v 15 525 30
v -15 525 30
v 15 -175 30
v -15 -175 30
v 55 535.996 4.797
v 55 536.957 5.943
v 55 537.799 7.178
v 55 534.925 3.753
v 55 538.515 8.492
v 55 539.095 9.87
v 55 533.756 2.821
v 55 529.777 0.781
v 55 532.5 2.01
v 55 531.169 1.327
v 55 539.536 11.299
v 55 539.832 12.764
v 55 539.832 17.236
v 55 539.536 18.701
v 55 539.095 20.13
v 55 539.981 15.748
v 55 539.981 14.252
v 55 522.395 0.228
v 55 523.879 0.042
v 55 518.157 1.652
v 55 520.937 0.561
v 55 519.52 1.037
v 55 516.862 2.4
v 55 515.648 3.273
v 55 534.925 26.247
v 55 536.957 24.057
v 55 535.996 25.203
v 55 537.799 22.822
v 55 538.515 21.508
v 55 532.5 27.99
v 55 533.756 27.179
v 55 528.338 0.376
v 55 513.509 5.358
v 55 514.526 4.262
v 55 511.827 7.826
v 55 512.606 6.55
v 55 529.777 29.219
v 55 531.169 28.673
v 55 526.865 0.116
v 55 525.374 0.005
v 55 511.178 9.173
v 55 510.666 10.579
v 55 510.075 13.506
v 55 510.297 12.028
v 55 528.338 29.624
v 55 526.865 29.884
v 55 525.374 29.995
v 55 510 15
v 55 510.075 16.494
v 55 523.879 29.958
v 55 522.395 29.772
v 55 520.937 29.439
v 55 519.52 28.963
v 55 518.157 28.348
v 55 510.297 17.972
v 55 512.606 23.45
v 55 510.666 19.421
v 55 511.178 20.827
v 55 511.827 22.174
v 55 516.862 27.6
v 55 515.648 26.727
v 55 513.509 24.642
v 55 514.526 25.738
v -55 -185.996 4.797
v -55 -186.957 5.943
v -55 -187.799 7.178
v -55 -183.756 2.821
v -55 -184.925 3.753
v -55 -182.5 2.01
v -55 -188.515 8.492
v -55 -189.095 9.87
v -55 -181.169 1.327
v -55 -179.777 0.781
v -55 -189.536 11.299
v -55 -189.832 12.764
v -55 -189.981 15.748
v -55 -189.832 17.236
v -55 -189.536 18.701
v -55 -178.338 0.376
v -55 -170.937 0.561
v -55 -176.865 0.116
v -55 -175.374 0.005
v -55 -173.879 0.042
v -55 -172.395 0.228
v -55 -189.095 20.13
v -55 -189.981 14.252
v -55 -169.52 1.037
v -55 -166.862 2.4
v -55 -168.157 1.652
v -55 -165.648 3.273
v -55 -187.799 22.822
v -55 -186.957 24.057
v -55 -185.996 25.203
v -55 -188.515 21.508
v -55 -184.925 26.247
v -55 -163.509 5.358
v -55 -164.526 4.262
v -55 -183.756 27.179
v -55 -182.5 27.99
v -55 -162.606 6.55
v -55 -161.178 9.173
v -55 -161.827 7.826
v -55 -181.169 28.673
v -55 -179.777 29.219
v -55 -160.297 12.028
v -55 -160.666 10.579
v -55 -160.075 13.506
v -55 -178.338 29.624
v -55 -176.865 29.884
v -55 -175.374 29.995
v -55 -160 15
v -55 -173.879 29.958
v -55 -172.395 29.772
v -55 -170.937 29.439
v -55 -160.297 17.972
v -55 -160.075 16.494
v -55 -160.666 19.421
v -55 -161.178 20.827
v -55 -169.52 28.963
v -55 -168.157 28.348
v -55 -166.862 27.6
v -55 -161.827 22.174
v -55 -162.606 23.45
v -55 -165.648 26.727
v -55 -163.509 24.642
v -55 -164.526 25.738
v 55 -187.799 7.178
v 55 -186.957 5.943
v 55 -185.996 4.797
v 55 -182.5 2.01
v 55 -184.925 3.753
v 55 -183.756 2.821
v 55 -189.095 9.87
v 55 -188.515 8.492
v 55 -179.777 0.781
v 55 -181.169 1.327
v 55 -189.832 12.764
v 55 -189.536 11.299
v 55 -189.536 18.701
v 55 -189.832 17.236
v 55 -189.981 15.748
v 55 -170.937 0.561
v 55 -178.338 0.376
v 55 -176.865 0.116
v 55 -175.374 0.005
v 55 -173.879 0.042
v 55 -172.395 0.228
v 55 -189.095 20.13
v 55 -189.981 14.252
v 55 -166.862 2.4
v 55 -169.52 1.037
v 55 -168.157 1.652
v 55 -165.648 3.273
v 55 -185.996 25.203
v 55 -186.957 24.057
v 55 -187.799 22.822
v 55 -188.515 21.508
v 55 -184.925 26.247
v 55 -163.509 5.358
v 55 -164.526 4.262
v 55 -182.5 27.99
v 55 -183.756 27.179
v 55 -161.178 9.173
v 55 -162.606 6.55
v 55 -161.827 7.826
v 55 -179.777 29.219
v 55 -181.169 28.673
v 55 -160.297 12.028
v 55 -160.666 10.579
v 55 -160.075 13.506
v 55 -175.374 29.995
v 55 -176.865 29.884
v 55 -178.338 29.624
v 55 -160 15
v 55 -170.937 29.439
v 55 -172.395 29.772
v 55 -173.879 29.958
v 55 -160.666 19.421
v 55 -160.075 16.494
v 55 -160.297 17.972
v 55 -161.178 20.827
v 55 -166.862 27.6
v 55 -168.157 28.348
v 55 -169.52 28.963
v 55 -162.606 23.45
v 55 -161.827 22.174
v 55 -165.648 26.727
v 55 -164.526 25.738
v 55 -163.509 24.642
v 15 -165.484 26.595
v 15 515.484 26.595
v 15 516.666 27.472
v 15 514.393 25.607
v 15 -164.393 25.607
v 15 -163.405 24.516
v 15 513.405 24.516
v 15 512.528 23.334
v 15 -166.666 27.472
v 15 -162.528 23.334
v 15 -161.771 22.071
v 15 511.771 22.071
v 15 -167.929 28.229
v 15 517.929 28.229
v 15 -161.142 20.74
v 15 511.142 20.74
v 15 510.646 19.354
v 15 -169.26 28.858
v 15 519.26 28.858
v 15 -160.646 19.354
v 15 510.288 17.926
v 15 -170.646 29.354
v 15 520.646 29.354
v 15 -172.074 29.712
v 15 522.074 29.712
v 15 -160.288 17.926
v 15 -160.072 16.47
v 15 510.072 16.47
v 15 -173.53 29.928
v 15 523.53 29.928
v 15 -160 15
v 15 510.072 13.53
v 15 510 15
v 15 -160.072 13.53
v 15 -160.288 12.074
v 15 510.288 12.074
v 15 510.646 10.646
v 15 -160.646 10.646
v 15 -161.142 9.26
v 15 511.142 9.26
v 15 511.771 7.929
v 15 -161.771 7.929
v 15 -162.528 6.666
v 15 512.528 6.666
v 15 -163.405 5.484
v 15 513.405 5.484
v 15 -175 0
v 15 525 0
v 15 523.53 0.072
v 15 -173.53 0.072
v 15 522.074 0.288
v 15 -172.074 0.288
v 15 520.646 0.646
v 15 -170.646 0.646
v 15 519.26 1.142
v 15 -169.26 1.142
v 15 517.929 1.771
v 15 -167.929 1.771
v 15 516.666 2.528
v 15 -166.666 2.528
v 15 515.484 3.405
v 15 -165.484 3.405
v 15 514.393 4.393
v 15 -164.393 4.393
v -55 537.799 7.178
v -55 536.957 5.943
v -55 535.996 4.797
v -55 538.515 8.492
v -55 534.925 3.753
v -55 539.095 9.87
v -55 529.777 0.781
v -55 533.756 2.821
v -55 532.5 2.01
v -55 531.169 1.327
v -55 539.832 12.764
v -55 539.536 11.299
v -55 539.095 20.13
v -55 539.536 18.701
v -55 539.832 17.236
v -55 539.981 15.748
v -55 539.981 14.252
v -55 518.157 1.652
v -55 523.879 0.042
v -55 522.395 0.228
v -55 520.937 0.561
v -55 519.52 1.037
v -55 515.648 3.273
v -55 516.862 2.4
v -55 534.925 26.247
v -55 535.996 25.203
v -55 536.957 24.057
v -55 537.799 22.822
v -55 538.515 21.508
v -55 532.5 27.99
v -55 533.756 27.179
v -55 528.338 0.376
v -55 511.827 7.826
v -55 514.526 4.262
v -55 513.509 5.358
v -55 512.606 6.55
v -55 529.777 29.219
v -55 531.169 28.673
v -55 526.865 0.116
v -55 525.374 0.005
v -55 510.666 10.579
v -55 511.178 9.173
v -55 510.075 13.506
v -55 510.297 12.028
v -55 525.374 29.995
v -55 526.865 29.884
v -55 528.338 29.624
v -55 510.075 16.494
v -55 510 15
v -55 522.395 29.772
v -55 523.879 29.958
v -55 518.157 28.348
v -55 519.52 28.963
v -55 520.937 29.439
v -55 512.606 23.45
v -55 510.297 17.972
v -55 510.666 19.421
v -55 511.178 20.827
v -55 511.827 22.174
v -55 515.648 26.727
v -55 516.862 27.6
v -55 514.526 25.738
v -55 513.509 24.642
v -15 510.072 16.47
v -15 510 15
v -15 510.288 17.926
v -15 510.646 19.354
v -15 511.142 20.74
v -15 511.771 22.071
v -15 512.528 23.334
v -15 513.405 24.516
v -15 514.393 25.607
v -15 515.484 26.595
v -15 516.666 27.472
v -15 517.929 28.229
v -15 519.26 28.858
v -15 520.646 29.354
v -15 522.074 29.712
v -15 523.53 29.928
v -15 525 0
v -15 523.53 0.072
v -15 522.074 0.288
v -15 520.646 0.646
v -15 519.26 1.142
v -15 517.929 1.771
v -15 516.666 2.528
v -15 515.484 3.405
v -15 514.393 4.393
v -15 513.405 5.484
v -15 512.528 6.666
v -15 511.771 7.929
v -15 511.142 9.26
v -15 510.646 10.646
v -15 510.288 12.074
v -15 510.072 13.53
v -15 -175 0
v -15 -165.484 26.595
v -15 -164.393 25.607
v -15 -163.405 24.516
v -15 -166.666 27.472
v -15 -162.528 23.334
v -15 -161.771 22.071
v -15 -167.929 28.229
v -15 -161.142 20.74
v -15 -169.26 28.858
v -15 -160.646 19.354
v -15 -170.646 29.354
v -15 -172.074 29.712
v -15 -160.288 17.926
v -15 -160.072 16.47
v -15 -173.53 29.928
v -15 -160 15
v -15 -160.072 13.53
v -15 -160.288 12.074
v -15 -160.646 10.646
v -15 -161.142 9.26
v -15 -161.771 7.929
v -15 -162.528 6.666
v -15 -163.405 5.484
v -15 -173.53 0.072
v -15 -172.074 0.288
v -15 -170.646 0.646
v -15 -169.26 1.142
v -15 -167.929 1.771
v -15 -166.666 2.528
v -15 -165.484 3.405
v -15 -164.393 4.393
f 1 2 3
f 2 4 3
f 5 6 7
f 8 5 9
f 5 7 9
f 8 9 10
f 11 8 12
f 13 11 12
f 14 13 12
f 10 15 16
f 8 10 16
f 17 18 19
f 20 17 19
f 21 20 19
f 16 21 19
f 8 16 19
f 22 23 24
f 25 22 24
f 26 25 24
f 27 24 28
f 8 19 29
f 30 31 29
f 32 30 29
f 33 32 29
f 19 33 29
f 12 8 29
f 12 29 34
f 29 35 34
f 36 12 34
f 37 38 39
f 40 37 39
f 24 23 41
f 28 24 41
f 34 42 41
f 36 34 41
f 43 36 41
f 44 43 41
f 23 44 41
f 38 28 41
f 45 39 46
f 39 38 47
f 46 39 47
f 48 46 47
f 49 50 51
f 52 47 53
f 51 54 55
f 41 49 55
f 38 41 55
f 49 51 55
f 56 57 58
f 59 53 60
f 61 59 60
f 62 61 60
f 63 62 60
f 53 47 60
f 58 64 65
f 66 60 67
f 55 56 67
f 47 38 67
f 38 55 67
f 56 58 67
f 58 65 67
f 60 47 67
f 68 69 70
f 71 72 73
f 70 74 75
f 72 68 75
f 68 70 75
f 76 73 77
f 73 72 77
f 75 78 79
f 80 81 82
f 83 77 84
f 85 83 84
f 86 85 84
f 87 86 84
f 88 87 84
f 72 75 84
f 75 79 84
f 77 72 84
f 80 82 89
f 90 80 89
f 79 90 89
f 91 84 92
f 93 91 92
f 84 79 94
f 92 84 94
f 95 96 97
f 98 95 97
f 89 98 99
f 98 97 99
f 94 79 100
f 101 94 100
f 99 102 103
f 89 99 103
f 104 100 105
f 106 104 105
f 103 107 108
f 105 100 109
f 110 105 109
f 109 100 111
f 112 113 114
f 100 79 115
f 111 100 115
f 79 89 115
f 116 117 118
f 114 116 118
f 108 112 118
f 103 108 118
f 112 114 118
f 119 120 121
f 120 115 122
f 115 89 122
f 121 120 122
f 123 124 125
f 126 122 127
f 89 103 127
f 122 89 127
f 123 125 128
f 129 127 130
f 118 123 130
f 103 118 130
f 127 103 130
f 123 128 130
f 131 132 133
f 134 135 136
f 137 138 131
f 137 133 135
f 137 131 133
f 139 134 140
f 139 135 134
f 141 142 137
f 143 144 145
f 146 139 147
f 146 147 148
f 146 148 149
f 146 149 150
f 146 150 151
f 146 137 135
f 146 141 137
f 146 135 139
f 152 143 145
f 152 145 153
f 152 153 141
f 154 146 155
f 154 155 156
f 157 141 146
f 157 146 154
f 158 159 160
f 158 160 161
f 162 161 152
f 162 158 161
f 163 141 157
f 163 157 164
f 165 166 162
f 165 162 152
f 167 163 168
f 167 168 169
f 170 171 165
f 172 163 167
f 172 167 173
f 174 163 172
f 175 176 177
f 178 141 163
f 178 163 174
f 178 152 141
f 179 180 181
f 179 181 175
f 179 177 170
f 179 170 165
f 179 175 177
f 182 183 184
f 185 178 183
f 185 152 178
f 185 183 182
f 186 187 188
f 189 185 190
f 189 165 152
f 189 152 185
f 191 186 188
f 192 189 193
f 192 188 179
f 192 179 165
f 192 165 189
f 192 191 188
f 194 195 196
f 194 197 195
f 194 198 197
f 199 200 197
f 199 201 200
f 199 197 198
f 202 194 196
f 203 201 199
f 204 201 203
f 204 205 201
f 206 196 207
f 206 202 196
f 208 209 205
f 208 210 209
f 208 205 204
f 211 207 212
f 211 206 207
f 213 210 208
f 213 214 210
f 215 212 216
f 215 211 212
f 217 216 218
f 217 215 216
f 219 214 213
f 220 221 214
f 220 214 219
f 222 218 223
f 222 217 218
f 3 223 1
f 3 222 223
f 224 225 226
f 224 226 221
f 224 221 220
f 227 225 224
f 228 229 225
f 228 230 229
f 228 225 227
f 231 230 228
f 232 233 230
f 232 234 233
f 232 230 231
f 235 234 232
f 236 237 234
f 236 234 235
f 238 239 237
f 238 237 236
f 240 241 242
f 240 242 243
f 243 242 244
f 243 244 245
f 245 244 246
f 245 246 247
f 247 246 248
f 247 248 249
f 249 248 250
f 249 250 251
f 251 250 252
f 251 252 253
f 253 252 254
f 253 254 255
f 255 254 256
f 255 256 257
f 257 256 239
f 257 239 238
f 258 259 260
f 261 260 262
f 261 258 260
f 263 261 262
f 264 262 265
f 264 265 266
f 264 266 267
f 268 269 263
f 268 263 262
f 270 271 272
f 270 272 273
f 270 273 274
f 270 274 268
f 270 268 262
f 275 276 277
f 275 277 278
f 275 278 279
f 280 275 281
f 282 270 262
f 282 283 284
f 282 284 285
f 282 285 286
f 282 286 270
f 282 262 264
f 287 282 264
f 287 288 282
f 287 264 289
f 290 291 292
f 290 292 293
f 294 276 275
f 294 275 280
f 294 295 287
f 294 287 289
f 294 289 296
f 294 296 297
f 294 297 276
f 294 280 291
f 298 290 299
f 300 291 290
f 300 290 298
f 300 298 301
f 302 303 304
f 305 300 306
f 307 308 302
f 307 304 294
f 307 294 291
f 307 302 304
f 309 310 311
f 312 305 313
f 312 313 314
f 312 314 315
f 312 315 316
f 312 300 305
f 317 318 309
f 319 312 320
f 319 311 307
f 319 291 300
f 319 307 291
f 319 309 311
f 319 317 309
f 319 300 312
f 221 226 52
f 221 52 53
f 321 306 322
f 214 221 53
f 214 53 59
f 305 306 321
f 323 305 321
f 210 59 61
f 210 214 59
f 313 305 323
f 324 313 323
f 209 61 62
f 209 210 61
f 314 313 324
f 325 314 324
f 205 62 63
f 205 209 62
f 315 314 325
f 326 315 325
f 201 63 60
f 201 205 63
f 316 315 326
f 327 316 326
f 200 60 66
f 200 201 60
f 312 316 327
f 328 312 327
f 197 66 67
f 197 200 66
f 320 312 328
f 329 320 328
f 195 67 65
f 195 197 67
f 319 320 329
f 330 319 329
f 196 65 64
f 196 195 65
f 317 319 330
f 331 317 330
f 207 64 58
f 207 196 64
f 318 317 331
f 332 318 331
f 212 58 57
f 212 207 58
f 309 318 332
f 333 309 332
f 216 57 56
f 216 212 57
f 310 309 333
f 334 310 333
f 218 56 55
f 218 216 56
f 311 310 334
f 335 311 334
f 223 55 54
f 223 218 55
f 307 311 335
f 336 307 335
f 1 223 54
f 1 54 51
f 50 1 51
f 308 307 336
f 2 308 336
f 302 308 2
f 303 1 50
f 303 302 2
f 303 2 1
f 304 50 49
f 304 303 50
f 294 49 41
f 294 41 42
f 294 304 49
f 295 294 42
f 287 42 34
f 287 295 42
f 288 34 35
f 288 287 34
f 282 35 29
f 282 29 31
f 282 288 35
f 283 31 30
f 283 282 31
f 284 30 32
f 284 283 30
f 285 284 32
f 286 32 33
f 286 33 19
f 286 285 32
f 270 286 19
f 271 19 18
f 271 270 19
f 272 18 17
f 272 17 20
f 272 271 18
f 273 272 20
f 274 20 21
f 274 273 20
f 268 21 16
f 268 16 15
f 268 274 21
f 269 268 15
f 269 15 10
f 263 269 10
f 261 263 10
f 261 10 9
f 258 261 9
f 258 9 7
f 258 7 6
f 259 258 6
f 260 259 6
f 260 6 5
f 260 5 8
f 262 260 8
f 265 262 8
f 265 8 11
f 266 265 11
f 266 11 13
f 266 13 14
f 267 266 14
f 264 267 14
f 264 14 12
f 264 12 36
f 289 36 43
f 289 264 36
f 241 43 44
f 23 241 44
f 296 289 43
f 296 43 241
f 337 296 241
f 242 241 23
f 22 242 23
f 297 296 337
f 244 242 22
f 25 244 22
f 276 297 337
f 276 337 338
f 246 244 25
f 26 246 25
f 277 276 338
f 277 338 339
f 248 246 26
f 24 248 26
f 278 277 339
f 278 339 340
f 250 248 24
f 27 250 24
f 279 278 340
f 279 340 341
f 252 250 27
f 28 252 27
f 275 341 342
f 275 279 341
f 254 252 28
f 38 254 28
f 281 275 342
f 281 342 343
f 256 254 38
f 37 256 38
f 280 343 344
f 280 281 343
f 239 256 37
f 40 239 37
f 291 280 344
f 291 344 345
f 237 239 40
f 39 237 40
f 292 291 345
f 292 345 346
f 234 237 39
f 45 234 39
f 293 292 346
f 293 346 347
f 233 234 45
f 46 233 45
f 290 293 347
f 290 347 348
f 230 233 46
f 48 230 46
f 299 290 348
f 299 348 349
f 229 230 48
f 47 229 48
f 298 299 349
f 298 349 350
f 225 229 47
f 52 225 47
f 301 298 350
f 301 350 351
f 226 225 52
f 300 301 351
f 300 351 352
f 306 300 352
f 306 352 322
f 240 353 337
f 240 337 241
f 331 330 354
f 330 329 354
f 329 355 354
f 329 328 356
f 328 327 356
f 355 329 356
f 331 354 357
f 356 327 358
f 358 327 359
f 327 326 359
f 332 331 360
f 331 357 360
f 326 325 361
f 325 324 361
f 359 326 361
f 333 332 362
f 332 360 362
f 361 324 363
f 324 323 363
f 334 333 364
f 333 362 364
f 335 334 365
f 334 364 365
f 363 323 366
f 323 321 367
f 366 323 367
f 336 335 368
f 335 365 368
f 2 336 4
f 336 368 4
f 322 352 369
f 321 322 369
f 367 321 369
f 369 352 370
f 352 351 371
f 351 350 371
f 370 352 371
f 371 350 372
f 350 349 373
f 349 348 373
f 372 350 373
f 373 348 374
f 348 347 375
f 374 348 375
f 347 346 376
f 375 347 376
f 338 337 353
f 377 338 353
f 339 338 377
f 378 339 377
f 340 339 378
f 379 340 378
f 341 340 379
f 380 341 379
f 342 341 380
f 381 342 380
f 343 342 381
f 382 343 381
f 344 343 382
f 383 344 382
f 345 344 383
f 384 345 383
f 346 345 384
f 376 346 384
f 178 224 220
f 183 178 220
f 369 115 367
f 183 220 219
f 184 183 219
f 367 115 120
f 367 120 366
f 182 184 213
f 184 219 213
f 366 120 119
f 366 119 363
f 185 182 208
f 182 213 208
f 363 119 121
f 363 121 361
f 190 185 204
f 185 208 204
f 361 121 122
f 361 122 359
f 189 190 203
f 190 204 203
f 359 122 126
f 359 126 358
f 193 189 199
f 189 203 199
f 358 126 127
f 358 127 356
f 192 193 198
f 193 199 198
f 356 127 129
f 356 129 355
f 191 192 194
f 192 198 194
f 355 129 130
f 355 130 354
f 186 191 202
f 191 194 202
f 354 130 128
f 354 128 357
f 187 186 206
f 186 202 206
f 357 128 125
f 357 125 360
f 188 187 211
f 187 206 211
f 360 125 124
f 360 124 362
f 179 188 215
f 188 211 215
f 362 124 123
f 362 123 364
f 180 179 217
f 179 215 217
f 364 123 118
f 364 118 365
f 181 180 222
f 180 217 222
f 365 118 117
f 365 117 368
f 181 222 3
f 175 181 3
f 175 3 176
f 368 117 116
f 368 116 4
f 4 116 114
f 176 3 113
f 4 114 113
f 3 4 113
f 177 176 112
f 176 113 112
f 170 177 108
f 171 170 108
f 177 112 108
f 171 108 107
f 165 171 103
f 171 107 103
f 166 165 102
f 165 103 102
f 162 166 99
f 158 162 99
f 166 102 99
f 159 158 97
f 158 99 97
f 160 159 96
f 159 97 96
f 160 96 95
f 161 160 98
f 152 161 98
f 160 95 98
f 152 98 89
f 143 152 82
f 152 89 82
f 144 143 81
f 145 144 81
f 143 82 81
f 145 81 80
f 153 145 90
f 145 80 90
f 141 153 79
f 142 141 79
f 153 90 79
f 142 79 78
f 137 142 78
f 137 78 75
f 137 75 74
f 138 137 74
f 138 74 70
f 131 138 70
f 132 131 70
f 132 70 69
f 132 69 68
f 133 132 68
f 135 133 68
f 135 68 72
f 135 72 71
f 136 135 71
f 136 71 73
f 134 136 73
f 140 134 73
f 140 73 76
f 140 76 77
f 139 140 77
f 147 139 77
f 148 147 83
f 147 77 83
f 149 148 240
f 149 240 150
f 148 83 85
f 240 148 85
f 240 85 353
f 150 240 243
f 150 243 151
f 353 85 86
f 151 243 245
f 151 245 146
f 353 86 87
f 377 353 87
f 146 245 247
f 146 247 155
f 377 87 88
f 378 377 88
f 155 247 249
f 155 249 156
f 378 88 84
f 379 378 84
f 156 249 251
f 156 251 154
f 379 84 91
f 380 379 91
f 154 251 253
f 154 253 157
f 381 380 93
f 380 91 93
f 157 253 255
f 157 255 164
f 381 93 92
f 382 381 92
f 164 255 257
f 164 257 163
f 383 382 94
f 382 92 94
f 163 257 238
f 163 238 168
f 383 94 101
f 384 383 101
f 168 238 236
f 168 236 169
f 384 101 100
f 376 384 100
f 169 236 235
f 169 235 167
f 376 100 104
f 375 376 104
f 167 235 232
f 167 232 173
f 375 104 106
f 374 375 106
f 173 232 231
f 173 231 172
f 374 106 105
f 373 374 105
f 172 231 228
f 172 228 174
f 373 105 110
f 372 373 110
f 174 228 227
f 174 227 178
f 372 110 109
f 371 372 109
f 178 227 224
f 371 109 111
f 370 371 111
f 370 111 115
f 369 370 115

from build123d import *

# Parameters (mm, degrees)
SKETCH1_W                = 30
SKETCH1_H                = 350
BOSS_EXTRUDE1_DEPTH      = 30
BOSS_EXTRUDE2_DEPTH      = 40
BOSS_EXTRUDE2_DEPTH_BACK = 70
SKETCH2_R                = 15


with BuildPart() as part:
    # Sketch1 → Boss-Extrude1 (new body)
    with BuildSketch(Plane.XY):
        Rectangle(SKETCH1_W, SKETCH1_H)
    extrude(amount=BOSS_EXTRUDE1_DEPTH)

    # Sketch2 → Boss-Extrude2 (add, two sides: drawn at the far end of the back side and taken through both)
    with BuildSketch(Plane(origin=(15, 0, 0), x_dir=(0, 0, -1), z_dir=(1, 0, 0)).offset(-BOSS_EXTRUDE2_DEPTH_BACK)):
        with Locations(Location((-15, -175, 0), (0, 0, 90))):
            Circle(SKETCH2_R)
    extrude(amount=BOSS_EXTRUDE2_DEPTH + BOSS_EXTRUDE2_DEPTH_BACK)

    # Mirror1: part across plane


with BuildPart() as part_1:
    add(part.part)
    add(part.part.mirror(Plane(origin=(-15, 175, 30), x_dir=(0, 0, 1), z_dir=(0, -1, 0))))


solid = part_1.part
